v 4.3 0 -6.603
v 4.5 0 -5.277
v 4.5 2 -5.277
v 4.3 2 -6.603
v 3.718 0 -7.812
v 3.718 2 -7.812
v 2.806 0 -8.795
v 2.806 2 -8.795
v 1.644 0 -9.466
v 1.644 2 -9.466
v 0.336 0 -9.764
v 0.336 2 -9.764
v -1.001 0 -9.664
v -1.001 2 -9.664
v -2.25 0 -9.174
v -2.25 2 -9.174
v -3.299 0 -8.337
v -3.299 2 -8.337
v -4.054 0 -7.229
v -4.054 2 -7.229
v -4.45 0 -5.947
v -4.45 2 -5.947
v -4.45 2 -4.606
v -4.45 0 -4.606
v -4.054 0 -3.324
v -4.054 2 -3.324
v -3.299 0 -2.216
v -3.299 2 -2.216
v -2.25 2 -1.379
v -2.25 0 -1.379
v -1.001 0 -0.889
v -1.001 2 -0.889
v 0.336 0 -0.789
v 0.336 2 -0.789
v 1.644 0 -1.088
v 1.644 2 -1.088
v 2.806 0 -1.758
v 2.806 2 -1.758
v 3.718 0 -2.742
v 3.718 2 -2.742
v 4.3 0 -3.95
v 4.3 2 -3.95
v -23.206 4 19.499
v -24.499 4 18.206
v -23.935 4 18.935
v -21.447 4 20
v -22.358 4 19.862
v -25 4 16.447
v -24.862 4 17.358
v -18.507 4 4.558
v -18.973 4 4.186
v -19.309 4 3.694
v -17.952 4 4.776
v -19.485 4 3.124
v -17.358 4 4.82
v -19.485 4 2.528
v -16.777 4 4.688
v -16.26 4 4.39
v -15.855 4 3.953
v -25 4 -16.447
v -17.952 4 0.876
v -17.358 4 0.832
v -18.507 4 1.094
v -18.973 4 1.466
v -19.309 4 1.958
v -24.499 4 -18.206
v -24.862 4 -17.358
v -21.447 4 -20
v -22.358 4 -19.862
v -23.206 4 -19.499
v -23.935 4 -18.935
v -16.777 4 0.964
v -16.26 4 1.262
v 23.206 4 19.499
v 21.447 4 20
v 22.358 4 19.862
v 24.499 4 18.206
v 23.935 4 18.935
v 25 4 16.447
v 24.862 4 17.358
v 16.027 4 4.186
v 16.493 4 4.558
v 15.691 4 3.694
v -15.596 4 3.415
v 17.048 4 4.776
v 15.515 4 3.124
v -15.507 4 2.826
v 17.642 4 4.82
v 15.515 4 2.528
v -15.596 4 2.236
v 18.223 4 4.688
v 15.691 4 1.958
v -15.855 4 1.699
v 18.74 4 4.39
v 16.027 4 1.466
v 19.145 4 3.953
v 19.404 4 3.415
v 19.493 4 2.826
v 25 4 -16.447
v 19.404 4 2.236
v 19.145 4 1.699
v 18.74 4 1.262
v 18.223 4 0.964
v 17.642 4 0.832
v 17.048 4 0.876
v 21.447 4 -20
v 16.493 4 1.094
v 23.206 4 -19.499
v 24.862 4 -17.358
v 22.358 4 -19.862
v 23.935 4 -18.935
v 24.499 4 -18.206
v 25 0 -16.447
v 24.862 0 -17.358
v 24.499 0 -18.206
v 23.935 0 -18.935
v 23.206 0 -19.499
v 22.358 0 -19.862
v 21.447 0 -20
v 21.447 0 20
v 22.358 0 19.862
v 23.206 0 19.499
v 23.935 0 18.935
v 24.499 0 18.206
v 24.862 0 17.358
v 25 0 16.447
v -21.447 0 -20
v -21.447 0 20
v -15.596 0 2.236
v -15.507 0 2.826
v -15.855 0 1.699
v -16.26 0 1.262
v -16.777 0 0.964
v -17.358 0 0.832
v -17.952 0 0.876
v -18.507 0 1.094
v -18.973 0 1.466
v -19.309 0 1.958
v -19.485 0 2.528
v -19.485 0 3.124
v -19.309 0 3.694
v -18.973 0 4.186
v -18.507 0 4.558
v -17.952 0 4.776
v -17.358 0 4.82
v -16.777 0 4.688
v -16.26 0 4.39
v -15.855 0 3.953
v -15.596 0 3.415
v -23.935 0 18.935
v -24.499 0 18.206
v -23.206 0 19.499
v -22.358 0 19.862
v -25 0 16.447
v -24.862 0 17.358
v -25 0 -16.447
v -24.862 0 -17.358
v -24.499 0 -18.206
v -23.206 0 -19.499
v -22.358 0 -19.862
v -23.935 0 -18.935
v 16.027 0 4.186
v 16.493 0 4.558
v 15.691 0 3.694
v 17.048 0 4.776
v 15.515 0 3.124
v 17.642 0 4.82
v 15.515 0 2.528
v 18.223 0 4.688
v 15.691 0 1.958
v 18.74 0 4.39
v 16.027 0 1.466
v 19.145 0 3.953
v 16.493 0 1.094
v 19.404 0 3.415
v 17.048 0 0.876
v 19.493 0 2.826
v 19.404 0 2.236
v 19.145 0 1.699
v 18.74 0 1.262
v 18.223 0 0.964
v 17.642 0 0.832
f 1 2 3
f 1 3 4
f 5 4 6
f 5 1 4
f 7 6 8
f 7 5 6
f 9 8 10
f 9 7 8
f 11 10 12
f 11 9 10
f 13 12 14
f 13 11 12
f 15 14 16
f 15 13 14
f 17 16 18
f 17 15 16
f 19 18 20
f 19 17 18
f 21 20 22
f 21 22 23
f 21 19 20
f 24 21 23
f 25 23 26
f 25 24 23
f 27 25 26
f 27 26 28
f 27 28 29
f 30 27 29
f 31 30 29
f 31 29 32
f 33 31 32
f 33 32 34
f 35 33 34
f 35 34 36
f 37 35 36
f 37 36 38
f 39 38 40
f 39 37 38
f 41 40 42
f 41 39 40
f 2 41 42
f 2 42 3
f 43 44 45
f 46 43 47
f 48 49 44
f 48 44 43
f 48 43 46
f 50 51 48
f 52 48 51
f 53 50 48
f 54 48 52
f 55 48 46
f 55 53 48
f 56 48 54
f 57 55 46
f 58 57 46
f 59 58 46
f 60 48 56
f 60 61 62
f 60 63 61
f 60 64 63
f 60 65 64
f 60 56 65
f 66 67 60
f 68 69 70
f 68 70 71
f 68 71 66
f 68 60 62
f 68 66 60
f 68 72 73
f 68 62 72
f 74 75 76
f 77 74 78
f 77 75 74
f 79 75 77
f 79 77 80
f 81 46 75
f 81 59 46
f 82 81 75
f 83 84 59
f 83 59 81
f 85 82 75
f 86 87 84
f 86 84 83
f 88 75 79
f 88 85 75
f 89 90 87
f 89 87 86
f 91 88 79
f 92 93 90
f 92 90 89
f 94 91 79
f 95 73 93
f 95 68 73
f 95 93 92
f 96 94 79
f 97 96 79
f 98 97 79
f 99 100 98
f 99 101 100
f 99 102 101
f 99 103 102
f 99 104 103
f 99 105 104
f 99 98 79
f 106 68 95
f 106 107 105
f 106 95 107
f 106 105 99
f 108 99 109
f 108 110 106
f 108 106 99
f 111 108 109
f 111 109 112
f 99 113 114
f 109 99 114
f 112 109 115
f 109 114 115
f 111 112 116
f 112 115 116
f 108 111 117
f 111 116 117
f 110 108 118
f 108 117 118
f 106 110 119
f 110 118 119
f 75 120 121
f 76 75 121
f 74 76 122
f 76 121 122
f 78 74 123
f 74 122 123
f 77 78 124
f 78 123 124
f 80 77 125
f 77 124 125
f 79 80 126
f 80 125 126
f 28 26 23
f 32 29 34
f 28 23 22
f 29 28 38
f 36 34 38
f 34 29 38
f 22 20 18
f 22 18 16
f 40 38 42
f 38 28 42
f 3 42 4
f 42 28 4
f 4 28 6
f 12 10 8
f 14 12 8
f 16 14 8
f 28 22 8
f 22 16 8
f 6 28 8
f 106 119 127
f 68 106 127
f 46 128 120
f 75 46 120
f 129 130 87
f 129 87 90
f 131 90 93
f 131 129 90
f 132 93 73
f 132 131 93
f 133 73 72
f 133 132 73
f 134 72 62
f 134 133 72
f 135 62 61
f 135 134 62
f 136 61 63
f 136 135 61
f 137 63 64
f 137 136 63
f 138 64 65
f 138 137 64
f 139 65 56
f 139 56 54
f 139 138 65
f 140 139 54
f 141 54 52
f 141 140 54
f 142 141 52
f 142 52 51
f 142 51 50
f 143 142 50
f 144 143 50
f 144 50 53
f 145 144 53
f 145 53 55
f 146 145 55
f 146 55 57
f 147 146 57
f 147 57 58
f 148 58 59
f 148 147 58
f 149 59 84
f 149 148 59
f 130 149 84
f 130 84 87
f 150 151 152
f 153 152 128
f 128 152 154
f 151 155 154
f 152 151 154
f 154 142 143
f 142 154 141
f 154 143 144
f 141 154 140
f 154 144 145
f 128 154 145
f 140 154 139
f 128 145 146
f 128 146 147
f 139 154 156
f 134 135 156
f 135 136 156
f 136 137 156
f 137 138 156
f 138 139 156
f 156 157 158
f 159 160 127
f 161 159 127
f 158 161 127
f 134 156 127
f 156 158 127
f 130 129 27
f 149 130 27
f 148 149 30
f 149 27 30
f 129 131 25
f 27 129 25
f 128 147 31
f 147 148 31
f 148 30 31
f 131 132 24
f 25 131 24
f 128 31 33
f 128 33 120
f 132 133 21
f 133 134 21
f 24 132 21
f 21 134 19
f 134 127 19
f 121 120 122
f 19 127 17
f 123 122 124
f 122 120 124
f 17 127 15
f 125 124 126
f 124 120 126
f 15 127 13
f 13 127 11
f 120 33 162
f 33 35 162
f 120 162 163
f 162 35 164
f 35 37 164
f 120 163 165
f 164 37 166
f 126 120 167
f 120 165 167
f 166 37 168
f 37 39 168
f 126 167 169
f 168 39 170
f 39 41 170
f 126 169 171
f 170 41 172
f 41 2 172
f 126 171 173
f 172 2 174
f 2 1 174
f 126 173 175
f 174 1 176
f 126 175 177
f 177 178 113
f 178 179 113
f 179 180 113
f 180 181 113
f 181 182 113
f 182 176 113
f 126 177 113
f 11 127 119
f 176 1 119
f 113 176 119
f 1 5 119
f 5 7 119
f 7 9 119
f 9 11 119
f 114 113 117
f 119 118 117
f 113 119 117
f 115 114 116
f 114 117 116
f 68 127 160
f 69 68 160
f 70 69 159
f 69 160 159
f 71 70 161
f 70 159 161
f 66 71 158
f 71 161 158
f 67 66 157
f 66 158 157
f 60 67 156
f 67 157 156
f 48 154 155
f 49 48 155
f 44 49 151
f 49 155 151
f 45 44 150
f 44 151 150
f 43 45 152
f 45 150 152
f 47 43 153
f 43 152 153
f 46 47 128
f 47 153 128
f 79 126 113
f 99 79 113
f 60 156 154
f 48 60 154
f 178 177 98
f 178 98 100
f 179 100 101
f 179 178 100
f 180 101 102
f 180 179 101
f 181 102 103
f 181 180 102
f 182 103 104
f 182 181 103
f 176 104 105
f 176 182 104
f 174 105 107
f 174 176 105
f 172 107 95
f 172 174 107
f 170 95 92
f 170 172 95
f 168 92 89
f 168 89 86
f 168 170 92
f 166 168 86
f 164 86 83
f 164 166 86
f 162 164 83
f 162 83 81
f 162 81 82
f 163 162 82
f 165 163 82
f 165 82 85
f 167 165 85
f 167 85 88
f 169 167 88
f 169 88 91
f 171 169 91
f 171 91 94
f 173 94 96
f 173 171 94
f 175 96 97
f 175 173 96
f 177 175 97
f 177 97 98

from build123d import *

# Parameters (mm, degrees)
SKETCH1_R           = 2
BOSS_EXTRUDE2_DEPTH = 4
SKETCH1_8_R         = 4.5
CUT_EXTRUDE4_DEPTH  = 2


with BuildPart() as part:
    # Sketch1 → Boss-Extrude2 (new body)
    with BuildSketch(Plane(origin=(0, 0, 0), x_dir=(1, 0, 0), z_dir=(0, 1, 0))):
        with BuildLine():
            Line((21.446973136, 20), (-21.446973136, 20))
            ThreePointArc((-21.446973136, 20), (-23.935145745, 18.935145745), (-25, 16.446973136))
            Line((-25, 16.446973136), (-25, -16.446973136))
            ThreePointArc((-25, -16.446973136), (-23.935145745, -18.935145745), (-21.446973136, -20))
            Line((-21.446973136, -20), (21.446973136, -20))
            ThreePointArc((21.446973136, -20), (23.935145745, -18.935145745), (25, -16.446973136))
            Line((25, -16.446973136), (25, 16.446973136))
            ThreePointArc((25, 16.446973136), (23.935145745, 18.935145745), (21.446973136, 20))
        make_face()
        with Locations((-17.507214432, -2.825963154)):
            Circle(SKETCH1_R, mode=Mode.SUBTRACT)
        with Locations((17.492785568, -2.825963154)):
            Circle(SKETCH1_R, mode=Mode.SUBTRACT)
    extrude(amount=BOSS_EXTRUDE2_DEPTH)

    # Sketch1<8> → Cut-Extrude4 (cut)
    with BuildSketch(Plane(origin=(0, 0, 0), x_dir=(1, 0, 0), z_dir=(0, 1, 0))):
        with Locations((0, 5.276580282)):
            Circle(SKETCH1_8_R)
    extrude(amount=CUT_EXTRUDE4_DEPTH, mode=Mode.SUBTRACT)


solid = part.part
